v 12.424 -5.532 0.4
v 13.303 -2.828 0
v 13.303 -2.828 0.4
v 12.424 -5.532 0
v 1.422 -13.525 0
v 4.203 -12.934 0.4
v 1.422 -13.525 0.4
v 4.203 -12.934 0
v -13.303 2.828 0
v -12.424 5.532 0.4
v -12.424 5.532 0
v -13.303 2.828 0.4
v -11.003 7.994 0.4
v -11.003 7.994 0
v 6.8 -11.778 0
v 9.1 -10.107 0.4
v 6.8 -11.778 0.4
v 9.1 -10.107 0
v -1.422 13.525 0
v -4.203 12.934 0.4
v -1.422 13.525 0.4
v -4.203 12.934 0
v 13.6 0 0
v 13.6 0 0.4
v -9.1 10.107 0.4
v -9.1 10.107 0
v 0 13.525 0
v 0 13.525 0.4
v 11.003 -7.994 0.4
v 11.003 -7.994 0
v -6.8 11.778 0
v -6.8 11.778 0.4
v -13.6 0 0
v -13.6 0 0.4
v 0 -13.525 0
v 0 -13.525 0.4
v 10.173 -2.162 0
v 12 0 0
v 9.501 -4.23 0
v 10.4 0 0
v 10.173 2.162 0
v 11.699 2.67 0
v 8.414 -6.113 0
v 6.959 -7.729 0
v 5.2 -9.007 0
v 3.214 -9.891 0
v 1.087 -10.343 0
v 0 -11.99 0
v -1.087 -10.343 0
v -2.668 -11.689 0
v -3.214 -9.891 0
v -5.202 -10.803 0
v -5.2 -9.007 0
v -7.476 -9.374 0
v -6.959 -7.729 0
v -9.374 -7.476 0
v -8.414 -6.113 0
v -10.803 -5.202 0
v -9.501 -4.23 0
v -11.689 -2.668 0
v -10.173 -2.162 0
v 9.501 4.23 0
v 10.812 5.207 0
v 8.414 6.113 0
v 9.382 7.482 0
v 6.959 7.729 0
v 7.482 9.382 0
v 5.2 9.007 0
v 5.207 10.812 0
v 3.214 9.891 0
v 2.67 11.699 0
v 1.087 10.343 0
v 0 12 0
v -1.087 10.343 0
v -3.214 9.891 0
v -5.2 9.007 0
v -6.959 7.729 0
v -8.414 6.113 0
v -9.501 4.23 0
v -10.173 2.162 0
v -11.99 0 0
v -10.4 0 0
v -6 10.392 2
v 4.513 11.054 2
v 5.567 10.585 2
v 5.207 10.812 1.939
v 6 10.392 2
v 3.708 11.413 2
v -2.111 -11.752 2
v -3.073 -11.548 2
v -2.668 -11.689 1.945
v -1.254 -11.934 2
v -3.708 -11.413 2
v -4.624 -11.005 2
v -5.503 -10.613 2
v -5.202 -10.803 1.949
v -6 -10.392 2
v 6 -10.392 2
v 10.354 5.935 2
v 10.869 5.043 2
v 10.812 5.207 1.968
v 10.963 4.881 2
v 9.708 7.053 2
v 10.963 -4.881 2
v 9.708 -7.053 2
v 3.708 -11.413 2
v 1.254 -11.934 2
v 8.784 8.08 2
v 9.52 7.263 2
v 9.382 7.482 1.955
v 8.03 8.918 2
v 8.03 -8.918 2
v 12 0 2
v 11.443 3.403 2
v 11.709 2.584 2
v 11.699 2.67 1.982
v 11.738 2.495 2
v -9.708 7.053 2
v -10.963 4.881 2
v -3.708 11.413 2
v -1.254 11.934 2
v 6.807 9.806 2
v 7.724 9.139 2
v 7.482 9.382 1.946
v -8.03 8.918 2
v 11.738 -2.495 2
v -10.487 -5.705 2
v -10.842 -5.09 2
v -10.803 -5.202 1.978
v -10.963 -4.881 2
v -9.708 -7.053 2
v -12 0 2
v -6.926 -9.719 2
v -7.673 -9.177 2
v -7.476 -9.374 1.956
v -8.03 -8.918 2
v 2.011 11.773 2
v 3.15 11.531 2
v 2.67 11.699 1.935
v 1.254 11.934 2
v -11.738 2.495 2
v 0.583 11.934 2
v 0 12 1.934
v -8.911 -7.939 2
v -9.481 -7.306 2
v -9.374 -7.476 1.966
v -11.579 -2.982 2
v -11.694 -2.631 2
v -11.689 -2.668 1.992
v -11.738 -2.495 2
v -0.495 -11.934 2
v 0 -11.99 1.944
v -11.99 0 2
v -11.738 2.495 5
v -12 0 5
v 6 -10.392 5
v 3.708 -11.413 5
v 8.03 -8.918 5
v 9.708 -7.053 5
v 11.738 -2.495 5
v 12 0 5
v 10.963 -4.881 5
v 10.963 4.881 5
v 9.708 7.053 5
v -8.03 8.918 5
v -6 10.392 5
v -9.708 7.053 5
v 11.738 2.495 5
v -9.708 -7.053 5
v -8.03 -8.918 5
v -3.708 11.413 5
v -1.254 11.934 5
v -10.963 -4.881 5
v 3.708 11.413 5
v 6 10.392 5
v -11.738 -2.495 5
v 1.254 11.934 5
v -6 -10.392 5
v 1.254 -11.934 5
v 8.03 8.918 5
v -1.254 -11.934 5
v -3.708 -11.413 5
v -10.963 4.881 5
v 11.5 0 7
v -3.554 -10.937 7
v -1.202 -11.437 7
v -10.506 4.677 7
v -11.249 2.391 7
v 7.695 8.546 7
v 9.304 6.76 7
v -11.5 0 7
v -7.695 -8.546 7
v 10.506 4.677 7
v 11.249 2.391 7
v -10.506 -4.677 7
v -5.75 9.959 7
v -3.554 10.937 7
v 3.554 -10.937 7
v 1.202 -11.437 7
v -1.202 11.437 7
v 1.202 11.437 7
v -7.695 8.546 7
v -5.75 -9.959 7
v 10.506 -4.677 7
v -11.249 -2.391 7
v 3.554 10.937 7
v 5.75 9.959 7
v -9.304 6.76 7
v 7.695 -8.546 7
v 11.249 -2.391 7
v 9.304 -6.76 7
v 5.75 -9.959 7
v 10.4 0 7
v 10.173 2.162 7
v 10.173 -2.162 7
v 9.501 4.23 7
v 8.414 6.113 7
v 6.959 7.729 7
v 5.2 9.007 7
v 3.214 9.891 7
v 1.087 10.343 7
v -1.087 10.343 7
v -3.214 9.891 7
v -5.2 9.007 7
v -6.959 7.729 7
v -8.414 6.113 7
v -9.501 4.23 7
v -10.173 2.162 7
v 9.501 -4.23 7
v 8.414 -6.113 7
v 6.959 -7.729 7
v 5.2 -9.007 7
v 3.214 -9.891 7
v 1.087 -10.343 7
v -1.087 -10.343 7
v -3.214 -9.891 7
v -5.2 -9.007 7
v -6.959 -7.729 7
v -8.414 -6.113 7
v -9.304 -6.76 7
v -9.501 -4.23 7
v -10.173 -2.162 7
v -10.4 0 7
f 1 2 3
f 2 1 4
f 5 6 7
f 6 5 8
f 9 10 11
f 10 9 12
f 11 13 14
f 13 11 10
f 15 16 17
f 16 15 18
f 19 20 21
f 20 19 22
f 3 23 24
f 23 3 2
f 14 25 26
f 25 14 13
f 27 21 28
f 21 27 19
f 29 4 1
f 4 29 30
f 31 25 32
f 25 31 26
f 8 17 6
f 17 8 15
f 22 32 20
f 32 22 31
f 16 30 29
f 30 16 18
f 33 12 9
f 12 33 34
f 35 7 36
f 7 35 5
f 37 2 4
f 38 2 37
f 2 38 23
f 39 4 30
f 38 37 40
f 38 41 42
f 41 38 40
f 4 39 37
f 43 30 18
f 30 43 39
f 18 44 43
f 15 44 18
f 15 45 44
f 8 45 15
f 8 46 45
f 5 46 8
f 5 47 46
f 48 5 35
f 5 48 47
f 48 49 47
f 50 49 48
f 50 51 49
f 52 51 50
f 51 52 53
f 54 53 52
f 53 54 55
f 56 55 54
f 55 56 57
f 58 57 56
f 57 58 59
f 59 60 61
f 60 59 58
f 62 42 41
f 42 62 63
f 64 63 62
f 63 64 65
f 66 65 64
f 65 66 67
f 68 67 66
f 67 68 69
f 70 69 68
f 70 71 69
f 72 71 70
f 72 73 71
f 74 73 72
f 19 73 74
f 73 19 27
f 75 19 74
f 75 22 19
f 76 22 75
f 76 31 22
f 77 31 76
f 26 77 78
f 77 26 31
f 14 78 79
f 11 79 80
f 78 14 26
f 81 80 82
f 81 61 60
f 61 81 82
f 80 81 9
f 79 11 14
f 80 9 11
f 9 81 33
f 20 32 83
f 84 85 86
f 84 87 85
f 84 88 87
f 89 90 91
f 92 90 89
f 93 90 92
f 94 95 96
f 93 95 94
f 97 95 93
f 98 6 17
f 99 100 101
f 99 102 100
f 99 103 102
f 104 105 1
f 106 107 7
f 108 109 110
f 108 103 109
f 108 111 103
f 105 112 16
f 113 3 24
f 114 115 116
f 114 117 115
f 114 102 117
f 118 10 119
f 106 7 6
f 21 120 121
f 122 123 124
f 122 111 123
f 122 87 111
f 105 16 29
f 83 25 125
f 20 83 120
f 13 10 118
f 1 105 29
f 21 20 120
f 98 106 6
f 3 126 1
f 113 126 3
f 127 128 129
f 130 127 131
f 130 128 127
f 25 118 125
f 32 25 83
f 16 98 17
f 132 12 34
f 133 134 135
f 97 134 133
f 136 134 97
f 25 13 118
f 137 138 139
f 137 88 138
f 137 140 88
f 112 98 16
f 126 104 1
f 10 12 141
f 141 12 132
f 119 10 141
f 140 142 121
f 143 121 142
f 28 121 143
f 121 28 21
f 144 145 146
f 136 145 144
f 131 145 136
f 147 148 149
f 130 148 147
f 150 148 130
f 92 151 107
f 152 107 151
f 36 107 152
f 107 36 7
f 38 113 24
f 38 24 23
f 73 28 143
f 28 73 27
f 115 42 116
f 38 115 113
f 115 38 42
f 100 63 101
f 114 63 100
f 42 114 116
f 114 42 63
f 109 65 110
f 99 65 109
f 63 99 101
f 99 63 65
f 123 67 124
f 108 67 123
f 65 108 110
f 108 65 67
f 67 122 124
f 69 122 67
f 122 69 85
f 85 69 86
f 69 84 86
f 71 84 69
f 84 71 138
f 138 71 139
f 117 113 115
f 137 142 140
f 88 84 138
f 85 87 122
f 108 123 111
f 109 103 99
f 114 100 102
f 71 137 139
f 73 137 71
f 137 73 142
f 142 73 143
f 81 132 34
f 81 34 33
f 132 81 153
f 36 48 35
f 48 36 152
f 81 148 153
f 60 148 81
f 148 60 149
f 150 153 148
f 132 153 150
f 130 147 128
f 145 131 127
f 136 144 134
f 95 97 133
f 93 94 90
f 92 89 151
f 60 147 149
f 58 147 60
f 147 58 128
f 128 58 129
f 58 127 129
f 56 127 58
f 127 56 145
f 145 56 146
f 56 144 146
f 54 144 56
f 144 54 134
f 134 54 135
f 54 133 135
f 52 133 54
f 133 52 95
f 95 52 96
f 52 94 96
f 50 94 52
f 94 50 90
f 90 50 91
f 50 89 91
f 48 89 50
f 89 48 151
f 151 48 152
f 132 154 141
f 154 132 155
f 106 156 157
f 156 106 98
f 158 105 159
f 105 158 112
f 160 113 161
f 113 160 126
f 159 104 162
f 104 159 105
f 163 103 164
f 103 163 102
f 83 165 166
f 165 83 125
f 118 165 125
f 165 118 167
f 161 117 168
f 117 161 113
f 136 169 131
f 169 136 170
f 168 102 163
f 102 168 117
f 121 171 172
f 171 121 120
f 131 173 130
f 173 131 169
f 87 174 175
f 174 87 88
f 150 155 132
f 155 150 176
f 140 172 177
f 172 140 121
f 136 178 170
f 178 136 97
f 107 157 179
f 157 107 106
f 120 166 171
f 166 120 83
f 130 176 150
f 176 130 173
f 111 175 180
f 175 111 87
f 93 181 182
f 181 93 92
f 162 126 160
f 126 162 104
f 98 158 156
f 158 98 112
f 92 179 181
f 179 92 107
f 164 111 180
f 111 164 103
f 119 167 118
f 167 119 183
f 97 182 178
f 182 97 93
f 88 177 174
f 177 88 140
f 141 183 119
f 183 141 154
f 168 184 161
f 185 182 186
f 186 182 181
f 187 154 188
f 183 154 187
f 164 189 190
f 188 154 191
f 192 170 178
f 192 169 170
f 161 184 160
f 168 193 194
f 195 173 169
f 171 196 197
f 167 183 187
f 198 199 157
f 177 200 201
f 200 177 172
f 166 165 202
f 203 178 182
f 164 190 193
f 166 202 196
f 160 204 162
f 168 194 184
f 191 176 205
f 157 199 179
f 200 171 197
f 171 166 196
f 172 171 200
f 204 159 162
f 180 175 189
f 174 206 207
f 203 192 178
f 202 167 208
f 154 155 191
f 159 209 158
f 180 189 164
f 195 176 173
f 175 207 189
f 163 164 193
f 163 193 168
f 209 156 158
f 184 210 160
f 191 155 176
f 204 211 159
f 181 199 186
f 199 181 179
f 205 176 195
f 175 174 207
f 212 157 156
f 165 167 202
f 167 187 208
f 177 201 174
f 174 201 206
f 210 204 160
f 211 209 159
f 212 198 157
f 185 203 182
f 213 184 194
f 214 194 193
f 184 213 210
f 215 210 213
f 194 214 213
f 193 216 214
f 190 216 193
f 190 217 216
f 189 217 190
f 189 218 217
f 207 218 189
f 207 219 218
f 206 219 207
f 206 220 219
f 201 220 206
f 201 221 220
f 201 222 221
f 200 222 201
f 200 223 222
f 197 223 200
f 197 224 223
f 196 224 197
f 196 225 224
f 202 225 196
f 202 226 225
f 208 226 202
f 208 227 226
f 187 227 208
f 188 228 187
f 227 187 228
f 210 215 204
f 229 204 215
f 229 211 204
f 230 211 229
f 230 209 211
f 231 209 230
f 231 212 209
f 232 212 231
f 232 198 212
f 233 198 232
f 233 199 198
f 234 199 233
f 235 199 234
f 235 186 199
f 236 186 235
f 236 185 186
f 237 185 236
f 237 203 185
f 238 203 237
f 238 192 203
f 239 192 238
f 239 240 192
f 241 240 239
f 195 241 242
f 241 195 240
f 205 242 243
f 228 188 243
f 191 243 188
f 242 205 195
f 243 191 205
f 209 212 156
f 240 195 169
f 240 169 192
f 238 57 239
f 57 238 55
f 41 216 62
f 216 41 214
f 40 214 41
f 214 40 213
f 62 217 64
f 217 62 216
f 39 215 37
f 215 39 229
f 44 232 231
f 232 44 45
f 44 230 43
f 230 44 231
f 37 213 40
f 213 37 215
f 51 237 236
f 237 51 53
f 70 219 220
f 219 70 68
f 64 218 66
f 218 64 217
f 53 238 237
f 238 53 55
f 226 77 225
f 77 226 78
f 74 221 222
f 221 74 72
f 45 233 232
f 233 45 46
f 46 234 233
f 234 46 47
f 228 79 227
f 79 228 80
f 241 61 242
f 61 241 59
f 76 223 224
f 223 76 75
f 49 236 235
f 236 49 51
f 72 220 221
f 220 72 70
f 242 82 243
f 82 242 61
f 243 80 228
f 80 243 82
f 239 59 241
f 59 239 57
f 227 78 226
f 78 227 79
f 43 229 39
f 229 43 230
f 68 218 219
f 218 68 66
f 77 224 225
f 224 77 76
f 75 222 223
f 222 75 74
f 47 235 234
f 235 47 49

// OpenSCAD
// include <Settings.scad>

motorSaferRing(20, 23, 0.1);

module motorSaferRing(motorDiameter, motorHolderOuterDiameter, tlrnc) {

    neckRadius=motorDiameter/2 + 2;
    dz = 0.01;

    difference() {
        union(){
            difference() {
                union() {
                    cylinder(h = 0.4, r = neckRadius + 1.6 );
                    translate([0,0,0.4]) {
                        cylinder(h=1.6, r1=neckRadius + 1.6, r2=neckRadius);
                    }
                }
                rotate_extrude(angle=90, convexity=10) {
                    translate([neckRadius, -dz, 0]) square(size=2+dz);
                }
                rotate_extrude(angle=90, convexity=10) {
                    translate([-(neckRadius + 2), -dz, 0]) square(size=2+dz);
                }
            }
            translate([0,0,2]) {
                cylinder(h=3, r=neckRadius);
            }
            translate([0,0,5]) {
                cylinder(h=2, r1=neckRadius, r2=motorHolderOuterDiameter/ 2);
            }
        }
        translate([0,0,-dz]) cylinder(h=7 + 2*dz, d = motorDiameter + 8*tlrnc);
    }
}
